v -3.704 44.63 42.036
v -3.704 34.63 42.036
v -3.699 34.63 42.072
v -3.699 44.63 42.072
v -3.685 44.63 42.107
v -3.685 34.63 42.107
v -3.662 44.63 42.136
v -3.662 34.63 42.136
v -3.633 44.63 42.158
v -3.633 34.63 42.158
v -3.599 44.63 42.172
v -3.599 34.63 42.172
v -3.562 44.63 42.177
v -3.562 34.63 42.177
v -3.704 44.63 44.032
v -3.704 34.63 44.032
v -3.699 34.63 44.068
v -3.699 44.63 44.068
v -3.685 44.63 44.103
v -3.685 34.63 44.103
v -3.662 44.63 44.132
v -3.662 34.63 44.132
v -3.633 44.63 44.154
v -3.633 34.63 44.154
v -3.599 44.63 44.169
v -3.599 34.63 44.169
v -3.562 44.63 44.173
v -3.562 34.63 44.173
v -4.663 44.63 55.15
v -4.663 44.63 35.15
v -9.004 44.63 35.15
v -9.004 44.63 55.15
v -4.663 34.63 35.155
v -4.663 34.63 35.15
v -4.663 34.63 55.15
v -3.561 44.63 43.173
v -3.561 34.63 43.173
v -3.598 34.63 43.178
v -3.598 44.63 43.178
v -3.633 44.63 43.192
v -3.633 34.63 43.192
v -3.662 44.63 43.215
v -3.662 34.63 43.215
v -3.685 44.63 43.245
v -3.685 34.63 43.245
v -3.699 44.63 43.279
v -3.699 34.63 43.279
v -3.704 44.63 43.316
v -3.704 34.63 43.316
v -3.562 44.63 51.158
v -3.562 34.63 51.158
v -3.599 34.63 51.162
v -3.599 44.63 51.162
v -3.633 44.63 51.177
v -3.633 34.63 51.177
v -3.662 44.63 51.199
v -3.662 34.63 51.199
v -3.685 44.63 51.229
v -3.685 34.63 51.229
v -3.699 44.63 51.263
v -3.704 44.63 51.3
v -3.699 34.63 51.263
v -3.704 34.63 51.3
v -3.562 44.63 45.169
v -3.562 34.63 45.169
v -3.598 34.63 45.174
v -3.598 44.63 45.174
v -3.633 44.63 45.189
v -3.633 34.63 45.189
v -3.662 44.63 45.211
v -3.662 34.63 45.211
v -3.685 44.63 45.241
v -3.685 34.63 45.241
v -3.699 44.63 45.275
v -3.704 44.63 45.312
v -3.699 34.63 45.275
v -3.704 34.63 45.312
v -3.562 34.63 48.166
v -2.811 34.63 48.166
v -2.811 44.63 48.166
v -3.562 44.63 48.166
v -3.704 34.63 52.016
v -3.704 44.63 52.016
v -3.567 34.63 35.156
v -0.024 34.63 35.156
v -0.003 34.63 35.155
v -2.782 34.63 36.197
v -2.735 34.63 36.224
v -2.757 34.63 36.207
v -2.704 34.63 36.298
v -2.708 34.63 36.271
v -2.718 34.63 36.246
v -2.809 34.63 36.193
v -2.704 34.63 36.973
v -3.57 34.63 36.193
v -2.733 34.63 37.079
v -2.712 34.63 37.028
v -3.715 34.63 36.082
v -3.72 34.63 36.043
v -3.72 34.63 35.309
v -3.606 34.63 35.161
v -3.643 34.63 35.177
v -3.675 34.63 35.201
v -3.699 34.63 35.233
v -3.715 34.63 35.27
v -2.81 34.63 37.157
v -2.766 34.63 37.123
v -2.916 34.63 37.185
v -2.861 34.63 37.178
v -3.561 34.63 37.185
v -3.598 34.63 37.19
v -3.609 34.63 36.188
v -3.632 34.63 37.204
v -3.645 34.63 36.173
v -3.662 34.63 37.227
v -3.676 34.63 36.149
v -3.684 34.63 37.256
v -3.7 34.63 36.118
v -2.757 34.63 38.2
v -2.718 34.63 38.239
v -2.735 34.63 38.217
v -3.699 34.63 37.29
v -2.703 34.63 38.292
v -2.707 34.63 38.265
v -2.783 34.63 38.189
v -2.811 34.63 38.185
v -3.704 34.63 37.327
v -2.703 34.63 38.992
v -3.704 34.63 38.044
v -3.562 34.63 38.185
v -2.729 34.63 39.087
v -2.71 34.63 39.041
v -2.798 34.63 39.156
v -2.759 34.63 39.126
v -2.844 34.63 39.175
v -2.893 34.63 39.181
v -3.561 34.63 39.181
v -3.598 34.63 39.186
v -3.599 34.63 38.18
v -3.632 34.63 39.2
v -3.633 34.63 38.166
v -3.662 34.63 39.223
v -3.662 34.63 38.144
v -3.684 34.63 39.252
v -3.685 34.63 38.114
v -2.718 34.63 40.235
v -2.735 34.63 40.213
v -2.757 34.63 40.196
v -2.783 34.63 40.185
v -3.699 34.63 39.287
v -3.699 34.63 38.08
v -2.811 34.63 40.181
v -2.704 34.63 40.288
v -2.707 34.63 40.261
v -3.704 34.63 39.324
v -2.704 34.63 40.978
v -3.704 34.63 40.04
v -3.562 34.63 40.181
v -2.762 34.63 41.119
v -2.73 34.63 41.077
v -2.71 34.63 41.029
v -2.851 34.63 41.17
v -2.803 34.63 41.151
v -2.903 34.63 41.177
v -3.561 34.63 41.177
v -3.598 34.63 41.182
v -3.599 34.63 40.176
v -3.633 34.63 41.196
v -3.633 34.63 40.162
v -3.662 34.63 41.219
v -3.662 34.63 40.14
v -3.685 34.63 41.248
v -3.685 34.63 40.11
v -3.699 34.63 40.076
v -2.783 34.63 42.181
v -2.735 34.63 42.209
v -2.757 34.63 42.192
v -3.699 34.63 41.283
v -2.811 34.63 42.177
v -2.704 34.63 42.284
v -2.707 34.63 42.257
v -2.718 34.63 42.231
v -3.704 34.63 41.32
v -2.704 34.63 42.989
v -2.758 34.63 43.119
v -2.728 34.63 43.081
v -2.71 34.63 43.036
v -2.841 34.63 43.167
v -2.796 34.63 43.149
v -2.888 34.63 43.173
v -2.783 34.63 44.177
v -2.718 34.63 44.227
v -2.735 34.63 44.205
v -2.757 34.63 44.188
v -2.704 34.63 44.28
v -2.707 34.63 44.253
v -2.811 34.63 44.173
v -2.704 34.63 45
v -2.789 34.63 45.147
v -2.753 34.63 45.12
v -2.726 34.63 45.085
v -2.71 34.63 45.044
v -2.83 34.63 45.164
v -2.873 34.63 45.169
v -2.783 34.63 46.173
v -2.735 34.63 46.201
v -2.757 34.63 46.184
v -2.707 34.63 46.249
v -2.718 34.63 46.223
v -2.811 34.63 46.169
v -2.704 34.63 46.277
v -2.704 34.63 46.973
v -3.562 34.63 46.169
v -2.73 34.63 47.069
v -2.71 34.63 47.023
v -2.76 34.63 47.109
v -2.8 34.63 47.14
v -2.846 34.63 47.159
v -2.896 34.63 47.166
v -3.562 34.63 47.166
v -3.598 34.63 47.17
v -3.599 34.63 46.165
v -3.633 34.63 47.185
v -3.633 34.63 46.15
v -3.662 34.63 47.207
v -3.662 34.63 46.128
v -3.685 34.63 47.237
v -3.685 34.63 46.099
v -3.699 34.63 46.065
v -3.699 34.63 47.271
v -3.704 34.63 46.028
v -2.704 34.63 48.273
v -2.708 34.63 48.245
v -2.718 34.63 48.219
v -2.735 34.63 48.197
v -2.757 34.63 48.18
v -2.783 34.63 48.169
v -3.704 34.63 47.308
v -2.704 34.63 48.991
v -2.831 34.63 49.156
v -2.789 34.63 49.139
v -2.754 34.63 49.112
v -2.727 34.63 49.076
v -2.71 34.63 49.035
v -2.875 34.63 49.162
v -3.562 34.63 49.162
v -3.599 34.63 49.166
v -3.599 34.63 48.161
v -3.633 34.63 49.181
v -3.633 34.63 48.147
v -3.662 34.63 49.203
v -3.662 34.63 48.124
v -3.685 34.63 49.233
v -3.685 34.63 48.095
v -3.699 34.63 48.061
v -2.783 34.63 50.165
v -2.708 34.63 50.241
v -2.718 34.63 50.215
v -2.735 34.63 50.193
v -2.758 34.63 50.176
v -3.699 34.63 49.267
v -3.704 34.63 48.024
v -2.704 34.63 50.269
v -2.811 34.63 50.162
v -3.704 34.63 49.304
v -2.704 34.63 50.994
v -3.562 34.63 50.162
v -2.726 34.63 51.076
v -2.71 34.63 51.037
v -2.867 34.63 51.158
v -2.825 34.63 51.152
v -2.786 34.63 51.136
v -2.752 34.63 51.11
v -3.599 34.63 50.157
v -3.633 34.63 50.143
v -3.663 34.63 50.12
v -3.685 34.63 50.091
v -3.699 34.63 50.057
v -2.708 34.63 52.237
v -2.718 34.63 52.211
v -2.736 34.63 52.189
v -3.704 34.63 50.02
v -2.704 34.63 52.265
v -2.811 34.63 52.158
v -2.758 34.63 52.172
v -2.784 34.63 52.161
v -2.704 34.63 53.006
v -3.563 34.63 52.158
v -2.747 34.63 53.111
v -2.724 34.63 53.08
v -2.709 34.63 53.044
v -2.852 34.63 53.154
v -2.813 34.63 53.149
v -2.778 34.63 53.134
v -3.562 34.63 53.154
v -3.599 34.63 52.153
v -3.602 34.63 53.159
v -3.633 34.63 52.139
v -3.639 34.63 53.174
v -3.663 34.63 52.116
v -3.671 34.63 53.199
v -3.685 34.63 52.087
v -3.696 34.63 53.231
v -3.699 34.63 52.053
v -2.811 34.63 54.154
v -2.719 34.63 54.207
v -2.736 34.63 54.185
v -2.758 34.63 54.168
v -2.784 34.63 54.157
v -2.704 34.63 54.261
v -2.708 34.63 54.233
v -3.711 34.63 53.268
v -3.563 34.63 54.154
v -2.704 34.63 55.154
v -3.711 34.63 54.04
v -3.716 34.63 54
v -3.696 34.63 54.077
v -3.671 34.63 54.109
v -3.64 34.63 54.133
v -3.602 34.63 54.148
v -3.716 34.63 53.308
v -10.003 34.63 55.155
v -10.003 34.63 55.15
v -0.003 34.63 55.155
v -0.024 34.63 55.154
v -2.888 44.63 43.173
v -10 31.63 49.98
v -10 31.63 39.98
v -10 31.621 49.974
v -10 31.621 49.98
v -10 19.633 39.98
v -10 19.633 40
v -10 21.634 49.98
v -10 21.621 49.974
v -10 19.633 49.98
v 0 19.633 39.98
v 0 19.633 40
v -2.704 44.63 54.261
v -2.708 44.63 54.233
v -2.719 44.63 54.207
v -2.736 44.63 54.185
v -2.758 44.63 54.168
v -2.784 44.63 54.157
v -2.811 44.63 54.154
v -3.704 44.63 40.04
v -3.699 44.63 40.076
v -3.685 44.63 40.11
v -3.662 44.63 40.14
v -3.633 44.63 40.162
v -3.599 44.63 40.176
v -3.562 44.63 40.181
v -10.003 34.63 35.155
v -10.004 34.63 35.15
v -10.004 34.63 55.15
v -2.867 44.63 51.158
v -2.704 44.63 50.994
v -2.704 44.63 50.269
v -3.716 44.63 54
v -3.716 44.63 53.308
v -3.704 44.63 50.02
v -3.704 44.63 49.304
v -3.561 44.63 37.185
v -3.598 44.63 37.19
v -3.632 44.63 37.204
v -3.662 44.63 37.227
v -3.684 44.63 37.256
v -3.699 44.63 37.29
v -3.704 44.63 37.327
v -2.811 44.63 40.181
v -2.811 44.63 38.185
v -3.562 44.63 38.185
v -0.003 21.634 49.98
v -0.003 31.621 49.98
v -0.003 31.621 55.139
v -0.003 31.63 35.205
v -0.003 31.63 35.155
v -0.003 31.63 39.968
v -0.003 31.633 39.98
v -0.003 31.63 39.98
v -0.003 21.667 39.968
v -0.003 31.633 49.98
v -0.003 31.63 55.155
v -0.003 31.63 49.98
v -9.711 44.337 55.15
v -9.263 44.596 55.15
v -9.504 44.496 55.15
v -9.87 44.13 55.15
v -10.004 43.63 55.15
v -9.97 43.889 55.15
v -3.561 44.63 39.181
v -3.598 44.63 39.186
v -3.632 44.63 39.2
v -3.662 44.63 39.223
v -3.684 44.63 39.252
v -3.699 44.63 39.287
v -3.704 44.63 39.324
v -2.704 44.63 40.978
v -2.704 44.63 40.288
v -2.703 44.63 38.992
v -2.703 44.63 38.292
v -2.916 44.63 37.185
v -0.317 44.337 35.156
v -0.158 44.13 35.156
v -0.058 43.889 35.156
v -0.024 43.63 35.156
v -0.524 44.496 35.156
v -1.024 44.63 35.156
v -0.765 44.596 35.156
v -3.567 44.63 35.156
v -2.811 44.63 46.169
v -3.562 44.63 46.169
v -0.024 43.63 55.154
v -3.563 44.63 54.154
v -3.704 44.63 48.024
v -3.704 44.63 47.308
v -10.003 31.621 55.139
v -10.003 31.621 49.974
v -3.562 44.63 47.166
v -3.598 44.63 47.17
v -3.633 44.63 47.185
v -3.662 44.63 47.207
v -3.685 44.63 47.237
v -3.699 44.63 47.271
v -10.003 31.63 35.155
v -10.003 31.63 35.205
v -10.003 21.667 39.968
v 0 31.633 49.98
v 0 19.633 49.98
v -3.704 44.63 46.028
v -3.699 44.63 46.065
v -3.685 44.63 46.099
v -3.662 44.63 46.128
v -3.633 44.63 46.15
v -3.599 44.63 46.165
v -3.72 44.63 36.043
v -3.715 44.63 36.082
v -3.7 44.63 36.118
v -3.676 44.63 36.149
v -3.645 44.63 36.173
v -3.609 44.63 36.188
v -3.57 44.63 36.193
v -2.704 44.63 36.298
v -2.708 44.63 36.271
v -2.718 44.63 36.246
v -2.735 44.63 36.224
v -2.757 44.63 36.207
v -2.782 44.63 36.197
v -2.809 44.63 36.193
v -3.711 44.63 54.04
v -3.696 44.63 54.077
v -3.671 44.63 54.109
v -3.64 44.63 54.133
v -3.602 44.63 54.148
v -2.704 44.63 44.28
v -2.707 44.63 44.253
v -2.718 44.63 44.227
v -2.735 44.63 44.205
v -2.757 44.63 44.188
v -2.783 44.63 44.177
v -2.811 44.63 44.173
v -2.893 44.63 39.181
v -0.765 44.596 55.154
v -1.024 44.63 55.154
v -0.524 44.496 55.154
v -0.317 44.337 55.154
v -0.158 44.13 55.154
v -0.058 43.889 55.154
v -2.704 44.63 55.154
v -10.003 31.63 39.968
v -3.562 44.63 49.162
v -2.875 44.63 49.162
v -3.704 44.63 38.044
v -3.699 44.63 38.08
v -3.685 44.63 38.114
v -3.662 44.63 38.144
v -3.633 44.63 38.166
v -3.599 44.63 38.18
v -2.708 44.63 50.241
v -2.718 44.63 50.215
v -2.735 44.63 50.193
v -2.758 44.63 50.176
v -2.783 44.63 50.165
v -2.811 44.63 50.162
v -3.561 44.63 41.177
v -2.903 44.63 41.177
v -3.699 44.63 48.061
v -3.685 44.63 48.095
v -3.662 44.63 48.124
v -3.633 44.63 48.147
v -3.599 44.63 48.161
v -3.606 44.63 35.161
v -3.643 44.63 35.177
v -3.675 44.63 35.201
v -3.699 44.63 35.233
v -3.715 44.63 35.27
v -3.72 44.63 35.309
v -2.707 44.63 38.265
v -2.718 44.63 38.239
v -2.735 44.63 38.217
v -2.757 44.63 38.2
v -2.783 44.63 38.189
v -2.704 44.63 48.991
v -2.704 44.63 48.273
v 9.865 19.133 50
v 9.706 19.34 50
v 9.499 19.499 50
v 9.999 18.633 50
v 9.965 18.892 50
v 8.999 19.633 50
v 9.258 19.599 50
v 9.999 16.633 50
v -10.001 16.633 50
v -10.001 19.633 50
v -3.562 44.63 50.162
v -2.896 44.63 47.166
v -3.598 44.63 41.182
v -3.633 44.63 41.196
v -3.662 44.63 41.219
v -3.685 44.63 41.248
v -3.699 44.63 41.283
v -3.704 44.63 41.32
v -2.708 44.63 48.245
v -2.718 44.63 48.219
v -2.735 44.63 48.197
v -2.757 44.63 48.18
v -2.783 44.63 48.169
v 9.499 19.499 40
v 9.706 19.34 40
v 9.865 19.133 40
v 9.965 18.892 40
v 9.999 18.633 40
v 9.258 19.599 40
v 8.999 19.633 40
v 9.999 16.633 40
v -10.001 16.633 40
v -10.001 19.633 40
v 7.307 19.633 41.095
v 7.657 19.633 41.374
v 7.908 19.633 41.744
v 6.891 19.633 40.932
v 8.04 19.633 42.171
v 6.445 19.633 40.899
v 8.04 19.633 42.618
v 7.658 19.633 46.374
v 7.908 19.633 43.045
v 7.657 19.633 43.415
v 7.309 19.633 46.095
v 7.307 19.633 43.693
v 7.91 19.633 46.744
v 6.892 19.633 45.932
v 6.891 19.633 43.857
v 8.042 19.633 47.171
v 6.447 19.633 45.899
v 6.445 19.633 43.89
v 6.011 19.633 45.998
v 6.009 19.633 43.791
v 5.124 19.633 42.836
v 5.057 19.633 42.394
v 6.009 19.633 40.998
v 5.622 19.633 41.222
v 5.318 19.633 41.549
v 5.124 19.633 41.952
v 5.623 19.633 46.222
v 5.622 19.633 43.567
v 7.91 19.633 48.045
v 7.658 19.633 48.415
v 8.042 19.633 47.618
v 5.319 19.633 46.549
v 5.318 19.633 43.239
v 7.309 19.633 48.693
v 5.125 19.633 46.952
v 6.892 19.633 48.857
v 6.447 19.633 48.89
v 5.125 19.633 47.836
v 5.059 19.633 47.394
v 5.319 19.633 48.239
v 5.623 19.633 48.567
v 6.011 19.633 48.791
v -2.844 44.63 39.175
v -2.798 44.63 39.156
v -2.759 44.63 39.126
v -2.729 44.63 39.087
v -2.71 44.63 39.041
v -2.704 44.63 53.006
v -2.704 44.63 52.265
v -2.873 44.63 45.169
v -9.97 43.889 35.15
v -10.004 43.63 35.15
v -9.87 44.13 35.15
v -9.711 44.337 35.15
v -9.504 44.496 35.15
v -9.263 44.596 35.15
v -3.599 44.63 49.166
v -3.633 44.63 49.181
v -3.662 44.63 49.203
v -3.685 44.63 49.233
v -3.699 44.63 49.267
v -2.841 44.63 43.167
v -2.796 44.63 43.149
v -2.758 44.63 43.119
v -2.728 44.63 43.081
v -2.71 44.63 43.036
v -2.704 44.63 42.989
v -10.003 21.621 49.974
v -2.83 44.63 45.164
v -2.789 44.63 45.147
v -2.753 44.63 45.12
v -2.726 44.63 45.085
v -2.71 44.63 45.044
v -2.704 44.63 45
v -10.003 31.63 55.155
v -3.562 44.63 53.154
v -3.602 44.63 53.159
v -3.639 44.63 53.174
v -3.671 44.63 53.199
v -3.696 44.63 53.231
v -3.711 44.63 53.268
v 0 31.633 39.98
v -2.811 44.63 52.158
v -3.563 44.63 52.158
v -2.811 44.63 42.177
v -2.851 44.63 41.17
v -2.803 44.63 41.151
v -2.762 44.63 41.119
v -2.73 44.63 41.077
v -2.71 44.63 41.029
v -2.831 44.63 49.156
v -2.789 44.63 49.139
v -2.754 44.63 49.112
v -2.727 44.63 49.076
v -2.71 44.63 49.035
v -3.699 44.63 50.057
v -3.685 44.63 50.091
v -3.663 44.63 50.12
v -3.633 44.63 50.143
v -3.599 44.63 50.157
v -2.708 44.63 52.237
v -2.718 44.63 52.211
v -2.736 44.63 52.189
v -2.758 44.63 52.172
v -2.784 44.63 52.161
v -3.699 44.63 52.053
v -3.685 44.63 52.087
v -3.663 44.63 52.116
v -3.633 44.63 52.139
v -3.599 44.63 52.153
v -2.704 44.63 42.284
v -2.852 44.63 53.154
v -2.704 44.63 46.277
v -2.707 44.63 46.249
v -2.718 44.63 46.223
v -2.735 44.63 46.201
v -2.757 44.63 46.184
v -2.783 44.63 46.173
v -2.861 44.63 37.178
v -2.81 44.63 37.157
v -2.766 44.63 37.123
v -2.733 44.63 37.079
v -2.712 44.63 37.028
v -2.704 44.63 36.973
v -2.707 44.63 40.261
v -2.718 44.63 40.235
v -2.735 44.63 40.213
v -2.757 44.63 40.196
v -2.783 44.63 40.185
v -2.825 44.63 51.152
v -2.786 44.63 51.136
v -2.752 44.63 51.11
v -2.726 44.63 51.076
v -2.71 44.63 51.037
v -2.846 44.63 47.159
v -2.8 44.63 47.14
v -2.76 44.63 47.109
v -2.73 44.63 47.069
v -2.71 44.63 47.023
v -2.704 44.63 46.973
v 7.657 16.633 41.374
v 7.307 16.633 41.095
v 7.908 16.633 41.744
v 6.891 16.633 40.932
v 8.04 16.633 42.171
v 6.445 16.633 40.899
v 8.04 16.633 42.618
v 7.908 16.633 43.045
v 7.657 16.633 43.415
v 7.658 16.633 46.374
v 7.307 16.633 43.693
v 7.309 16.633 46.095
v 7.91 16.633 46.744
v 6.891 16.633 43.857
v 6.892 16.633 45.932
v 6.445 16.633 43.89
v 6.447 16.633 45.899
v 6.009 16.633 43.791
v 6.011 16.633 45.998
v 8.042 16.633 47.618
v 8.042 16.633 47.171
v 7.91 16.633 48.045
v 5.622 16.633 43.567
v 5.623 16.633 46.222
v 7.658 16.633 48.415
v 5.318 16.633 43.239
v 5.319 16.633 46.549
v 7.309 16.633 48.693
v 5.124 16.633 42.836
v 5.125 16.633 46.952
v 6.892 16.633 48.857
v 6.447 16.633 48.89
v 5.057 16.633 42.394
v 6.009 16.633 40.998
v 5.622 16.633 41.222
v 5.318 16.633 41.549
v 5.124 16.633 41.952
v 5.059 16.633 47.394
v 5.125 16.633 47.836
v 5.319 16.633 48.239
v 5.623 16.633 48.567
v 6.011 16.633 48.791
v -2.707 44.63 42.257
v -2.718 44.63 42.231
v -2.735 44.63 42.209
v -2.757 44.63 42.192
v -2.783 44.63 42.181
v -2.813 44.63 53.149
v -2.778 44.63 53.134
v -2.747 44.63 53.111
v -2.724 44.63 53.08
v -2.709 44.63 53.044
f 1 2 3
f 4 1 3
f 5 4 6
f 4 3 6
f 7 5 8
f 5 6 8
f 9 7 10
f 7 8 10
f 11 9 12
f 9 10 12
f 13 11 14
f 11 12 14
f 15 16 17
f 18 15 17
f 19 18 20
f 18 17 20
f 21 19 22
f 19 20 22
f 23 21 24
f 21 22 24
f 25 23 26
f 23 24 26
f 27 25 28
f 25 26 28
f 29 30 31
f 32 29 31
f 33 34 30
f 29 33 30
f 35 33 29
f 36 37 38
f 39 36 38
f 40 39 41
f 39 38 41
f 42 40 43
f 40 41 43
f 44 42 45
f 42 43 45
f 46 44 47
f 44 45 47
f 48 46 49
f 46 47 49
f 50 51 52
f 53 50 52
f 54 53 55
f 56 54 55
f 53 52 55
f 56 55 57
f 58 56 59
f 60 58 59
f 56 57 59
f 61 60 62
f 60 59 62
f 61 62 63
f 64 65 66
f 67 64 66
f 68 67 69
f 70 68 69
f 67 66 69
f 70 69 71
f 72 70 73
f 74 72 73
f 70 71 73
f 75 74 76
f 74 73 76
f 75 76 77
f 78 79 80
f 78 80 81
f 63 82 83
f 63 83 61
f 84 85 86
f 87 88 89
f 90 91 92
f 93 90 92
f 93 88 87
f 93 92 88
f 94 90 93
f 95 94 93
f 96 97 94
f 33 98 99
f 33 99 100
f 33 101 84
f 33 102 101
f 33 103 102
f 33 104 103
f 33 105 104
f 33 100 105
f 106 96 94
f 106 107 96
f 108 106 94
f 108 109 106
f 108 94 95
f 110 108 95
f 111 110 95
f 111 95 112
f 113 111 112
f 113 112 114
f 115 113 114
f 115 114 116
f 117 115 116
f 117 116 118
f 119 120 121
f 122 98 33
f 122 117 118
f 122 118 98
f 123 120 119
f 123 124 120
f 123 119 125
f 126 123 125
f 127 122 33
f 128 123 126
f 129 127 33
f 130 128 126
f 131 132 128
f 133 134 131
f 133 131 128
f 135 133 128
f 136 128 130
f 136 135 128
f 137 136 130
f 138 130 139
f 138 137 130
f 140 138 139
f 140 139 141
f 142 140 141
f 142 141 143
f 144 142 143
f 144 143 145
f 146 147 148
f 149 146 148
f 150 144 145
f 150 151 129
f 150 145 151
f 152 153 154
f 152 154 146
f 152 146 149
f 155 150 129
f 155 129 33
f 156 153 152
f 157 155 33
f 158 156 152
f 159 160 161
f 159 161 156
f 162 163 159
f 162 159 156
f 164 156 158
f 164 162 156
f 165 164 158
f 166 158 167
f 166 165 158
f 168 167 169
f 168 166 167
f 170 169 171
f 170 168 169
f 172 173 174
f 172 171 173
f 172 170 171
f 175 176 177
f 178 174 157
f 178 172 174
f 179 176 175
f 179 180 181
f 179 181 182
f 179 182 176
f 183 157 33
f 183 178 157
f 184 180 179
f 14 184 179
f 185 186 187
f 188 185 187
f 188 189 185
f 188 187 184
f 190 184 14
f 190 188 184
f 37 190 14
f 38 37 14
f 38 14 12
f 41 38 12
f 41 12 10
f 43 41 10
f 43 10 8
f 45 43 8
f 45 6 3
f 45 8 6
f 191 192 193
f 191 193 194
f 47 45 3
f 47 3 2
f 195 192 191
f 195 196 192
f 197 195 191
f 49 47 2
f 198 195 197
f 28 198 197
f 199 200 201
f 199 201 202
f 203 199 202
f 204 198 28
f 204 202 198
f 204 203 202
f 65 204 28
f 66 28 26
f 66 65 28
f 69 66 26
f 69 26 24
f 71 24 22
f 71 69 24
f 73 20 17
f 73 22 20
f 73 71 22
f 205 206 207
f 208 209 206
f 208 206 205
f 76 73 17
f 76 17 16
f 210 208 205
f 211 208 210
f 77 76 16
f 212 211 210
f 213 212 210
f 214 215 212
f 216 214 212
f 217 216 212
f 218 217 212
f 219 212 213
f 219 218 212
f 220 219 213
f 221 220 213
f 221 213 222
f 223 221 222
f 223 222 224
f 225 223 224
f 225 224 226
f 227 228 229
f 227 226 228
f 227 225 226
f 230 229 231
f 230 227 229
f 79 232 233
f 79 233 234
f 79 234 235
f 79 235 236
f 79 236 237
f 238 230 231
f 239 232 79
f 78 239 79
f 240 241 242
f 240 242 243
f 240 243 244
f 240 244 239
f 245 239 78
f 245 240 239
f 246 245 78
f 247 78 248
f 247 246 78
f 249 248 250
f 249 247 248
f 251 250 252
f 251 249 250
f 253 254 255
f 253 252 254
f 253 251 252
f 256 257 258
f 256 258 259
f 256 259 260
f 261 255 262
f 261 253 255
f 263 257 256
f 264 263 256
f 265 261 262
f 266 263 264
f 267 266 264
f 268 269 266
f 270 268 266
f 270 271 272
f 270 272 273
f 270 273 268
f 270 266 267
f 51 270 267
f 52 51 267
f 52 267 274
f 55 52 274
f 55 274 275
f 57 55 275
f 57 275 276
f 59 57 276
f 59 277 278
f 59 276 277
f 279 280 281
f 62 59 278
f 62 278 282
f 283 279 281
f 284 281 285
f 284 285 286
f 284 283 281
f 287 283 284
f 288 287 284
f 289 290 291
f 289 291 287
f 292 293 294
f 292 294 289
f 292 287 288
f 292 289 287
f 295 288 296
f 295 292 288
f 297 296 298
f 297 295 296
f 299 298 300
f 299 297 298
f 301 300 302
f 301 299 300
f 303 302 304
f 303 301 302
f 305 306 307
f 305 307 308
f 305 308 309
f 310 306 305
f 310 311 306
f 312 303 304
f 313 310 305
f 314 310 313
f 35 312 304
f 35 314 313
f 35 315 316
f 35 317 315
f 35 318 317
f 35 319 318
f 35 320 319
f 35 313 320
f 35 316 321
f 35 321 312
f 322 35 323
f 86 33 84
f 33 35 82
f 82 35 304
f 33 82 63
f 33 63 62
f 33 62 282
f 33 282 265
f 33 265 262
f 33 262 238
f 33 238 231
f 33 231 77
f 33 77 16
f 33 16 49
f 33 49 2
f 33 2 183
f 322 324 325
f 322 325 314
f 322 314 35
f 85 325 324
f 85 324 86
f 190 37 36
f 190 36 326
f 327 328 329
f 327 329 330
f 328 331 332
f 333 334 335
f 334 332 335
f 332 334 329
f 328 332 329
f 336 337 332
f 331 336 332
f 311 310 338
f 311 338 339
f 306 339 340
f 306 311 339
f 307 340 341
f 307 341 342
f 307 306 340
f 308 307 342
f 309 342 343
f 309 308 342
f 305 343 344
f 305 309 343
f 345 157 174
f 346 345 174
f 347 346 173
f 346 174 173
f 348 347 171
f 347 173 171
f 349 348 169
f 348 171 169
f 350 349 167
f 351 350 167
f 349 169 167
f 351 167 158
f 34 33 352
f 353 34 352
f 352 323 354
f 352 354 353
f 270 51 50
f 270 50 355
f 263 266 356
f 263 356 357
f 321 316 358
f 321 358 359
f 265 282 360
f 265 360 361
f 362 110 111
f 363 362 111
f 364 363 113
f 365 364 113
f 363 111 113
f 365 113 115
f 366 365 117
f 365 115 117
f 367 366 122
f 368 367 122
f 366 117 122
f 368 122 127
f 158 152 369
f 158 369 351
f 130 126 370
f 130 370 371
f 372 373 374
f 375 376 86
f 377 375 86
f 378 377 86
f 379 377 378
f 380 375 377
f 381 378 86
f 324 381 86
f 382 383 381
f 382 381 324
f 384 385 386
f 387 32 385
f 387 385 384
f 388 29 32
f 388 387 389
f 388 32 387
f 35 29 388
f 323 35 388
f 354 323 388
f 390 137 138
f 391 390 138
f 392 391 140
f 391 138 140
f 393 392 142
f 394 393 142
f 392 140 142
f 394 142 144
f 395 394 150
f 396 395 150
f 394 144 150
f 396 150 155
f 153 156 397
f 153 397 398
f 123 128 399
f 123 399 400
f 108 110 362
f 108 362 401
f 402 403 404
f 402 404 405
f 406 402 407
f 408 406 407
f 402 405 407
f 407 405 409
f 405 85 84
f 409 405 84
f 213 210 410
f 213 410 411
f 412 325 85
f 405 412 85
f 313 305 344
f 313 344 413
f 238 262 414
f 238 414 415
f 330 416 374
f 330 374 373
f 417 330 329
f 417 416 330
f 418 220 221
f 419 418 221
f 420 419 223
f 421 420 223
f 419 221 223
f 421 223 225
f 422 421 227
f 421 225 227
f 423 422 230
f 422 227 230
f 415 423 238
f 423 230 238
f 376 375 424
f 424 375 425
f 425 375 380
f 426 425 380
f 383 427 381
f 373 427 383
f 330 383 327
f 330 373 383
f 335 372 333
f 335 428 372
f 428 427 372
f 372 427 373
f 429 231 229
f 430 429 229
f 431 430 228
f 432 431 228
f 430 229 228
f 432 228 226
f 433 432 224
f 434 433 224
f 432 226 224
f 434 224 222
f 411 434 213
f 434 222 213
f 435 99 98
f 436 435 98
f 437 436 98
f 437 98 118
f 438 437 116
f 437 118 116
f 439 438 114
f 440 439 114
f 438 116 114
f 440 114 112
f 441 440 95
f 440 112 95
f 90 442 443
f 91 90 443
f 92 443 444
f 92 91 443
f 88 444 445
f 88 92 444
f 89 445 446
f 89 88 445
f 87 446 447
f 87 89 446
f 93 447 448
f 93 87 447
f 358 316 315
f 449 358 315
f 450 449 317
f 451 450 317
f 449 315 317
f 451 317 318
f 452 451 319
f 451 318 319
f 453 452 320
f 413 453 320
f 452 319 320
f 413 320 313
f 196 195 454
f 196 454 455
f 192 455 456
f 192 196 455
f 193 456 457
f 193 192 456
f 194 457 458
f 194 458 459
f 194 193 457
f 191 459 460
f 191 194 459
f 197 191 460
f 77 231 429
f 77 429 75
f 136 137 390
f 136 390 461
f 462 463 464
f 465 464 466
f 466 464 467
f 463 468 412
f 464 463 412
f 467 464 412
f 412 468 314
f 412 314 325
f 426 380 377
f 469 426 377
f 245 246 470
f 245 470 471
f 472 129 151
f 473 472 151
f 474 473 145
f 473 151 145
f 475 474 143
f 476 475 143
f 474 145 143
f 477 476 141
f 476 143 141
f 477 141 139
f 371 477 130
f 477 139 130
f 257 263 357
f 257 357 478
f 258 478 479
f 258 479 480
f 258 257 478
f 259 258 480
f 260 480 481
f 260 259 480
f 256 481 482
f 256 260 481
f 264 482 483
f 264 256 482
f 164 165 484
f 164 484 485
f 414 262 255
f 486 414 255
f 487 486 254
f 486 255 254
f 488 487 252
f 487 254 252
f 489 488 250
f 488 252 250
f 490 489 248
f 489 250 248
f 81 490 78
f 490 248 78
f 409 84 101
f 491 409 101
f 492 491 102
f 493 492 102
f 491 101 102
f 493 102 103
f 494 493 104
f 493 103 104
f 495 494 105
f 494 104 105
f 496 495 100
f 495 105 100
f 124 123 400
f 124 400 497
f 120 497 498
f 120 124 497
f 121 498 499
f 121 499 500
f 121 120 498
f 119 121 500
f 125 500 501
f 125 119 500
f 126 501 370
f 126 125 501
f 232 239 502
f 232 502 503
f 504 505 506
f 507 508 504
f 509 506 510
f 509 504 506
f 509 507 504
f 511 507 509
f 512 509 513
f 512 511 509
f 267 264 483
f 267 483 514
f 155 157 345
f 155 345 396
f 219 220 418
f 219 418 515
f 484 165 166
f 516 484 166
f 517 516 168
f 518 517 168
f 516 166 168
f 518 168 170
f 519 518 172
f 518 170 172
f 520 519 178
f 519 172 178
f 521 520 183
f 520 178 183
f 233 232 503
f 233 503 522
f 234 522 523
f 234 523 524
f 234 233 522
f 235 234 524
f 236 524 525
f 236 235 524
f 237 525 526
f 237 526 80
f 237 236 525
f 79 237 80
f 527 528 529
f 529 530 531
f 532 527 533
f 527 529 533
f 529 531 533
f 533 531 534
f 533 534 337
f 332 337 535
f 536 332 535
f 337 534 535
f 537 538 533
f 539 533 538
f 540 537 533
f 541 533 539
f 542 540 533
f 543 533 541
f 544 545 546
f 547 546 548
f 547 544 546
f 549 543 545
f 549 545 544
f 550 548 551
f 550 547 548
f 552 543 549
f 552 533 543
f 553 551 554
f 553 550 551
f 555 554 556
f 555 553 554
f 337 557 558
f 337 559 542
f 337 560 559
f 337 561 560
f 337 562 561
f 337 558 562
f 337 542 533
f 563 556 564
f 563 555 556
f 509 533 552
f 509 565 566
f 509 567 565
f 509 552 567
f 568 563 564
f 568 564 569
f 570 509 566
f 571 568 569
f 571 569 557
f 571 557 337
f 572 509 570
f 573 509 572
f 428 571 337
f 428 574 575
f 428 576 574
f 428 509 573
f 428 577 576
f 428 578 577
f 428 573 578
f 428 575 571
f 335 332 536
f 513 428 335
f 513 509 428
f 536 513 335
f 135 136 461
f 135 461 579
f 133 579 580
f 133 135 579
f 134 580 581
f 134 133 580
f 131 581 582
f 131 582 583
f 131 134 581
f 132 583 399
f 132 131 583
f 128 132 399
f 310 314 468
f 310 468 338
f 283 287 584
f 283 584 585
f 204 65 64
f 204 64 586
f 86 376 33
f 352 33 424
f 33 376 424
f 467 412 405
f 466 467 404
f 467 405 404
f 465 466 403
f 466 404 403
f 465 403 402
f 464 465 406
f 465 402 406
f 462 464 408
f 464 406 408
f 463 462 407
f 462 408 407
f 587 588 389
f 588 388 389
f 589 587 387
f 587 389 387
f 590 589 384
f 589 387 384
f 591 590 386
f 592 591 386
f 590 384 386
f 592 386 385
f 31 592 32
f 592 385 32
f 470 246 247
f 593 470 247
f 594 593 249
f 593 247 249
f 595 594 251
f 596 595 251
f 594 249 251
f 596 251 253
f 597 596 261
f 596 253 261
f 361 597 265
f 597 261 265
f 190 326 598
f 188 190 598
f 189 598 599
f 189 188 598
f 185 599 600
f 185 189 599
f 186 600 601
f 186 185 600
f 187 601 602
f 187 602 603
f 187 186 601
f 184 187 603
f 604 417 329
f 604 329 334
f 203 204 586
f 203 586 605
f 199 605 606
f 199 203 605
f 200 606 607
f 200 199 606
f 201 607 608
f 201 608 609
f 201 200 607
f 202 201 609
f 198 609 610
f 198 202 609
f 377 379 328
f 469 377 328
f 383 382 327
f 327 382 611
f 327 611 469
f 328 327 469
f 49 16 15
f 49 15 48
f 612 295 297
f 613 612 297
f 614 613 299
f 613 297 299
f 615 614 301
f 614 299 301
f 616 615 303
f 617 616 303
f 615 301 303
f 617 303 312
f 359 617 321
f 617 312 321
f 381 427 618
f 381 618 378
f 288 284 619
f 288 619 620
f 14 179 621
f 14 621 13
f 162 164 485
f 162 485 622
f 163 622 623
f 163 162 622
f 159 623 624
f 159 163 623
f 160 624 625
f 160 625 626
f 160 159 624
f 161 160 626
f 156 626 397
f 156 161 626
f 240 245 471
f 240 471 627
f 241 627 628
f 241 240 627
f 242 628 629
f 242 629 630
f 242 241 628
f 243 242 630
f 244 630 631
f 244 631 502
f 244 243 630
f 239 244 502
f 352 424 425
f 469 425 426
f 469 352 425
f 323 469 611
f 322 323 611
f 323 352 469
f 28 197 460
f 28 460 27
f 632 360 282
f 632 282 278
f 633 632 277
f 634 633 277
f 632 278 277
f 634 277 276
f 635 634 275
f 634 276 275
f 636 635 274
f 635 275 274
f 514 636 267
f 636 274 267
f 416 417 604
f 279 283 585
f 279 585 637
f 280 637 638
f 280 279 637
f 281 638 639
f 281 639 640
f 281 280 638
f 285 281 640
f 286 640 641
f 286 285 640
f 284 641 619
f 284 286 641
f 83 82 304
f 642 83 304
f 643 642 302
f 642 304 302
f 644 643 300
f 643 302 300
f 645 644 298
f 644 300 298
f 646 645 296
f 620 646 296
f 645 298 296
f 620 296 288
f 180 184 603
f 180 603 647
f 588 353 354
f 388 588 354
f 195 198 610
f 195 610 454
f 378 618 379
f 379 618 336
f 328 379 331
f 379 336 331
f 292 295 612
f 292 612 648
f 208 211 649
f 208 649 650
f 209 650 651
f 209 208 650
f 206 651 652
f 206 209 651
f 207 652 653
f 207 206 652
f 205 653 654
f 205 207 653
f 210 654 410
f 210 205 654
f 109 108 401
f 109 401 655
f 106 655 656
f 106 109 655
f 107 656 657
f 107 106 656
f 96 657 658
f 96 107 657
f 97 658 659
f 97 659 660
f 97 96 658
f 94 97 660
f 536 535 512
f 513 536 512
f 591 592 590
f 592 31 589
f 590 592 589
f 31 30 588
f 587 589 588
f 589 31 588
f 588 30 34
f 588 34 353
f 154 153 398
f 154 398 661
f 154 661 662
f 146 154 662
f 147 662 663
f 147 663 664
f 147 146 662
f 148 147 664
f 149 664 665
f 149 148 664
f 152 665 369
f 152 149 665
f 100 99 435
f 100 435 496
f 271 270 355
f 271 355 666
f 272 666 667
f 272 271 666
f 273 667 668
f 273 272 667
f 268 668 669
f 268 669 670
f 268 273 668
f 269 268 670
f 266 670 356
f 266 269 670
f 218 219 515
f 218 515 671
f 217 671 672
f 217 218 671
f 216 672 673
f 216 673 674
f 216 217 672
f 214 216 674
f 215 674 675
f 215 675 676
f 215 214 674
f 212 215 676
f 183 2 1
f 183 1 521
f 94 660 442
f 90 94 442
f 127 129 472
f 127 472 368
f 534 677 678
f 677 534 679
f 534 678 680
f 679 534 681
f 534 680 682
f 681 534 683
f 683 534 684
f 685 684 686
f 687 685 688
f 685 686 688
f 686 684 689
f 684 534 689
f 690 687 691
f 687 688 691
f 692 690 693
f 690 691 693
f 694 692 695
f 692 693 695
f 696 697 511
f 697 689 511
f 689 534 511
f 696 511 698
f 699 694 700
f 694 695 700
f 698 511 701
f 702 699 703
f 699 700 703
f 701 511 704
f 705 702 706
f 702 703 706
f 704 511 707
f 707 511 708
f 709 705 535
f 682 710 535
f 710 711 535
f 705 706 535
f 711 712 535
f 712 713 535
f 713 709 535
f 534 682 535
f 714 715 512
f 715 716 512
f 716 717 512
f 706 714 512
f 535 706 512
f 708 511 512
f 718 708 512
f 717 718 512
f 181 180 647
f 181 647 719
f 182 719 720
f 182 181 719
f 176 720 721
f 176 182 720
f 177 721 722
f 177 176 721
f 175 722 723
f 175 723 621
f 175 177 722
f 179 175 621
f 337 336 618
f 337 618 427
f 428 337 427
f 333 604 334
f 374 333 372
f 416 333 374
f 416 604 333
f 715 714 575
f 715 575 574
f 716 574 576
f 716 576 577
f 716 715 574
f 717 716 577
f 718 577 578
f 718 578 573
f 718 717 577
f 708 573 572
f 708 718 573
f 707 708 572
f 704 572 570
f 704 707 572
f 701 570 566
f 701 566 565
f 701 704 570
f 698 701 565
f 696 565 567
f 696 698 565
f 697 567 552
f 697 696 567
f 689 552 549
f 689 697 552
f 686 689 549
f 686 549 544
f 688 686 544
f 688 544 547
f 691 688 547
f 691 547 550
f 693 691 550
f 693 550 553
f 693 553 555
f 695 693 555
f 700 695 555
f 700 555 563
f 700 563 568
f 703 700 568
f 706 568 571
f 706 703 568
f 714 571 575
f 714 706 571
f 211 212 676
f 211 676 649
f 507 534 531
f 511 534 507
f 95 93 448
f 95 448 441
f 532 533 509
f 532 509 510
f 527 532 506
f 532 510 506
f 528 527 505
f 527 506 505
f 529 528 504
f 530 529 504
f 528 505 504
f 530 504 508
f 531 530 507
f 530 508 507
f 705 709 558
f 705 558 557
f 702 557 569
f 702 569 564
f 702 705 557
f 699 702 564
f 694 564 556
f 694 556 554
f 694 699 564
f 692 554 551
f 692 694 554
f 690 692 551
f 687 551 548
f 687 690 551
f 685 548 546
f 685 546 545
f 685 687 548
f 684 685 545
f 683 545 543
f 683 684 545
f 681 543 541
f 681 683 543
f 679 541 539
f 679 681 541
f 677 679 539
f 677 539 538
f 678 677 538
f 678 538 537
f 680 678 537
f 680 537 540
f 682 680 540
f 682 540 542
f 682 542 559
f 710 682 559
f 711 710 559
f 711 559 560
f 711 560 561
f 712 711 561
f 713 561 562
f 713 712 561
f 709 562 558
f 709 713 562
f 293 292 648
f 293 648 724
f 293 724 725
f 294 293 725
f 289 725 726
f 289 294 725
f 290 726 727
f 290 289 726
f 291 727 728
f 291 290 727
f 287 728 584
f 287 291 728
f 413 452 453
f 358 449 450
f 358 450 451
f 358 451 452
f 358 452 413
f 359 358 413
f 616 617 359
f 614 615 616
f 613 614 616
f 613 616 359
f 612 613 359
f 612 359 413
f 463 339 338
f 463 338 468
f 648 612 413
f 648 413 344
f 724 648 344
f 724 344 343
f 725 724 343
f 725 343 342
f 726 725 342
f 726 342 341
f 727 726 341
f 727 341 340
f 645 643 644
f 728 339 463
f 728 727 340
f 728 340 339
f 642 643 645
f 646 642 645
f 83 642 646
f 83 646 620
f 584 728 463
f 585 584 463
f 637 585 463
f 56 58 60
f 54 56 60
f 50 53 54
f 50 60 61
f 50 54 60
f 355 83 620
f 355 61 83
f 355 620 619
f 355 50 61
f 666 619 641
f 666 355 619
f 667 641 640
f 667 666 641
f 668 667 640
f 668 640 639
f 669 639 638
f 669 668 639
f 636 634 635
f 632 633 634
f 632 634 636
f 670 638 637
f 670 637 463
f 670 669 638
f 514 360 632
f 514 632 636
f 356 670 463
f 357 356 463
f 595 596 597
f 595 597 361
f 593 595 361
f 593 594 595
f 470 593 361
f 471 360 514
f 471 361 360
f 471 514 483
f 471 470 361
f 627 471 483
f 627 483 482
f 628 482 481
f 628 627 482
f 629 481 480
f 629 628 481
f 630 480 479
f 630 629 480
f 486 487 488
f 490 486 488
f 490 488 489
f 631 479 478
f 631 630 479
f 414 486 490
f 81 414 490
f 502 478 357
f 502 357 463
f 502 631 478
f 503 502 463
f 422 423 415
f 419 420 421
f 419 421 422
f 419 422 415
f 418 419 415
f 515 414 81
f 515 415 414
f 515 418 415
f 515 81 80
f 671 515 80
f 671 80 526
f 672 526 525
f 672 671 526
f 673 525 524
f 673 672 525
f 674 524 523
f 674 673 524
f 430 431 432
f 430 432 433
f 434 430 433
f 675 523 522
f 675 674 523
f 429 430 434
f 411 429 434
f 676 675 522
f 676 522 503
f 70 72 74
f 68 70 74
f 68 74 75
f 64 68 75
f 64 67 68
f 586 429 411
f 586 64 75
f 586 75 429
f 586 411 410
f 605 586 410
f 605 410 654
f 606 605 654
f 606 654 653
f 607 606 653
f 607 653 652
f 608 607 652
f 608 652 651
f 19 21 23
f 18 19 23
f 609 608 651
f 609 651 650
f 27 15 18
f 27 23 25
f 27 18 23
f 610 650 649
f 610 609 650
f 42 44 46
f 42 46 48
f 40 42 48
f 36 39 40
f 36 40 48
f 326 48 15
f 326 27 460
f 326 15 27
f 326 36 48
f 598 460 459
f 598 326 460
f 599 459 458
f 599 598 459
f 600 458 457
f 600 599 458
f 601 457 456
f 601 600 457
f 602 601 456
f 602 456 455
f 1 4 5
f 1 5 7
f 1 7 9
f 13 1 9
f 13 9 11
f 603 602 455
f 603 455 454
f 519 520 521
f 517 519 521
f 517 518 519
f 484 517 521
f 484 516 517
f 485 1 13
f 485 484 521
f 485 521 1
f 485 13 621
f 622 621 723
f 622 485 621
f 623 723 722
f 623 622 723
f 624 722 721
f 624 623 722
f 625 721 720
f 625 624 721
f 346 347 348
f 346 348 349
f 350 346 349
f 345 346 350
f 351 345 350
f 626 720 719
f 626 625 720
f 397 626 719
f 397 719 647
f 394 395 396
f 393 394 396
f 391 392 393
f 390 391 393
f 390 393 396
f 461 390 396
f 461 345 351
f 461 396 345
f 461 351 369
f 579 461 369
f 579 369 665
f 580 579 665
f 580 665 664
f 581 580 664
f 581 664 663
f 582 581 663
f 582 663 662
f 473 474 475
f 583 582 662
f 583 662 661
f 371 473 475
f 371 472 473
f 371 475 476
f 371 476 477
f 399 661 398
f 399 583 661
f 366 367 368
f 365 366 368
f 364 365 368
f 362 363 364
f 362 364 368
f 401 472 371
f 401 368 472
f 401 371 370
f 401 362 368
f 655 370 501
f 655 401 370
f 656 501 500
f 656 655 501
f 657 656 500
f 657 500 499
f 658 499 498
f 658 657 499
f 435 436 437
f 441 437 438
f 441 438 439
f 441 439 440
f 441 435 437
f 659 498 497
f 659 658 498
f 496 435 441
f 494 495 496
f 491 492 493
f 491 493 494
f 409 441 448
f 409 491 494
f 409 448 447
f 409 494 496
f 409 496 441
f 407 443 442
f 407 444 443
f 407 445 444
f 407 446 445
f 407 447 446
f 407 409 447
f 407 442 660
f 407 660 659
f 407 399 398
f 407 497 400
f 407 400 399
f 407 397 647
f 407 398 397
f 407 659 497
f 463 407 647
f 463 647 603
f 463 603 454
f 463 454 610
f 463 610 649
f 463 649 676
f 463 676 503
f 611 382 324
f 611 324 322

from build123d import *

# Parameters (mm, degrees)
SKETCH014_W  = 20
SKETCH014_H  = 10
SKETCH014_R  = 1.5
PAD006_DEPTH = 3
SKETCH015_W  = 10
SKETCH015_H  = 10
PAD007_DEPTH = 12
SKETCH028_W  = 10
SKETCH028_H  = 20
PAD014_DEPTH = 3
PAD015_DEPTH = 10
SKETCH029_W  = 5.341147
SKETCH029_H  = 20
PAD016_DEPTH = 10
PAD017_DEPTH = 10
FILLET001_R  = 1
FILLET002_R  = 1
FILLET003_R  = 1


with BuildPart() as part:
    # Sketch014 → Pad006 (new body)
    with BuildSketch(Plane(origin=(0, 16.63325, 0), x_dir=(-1, 0, 0), z_dir=(0, 1, 0))):
        with Locations((0.000853, 44.999577)):
            Rectangle(SKETCH014_W, SKETCH014_H)
        with Locations((-6.55861, 47.39436)):
            Circle(SKETCH014_R, mode=Mode.SUBTRACT)
        with Locations((-6.556974, 42.39436)):
            Circle(SKETCH014_R, mode=Mode.SUBTRACT)
    extrude(amount=PAD006_DEPTH)

    # Sketch015 (on Face8 of Pad006) → Pad007 (join)
    with BuildSketch(Plane(origin=(-10, 19.63325, 0), x_dir=(-1, 0, 0), z_dir=(0, 1, 0))):
        with Locations((-5, 44.980343)):
            Rectangle(SKETCH015_W, SKETCH015_H)
    extrude(amount=PAD007_DEPTH)

    # Sketch028 → Pad014 (join)
    with BuildSketch(Plane(origin=(0, 31.63, 0), x_dir=(-1, 0, 0), z_dir=(0, 1, 0))):
        with Locations((5.002885, 45.155186)):
            Rectangle(SKETCH028_W, SKETCH028_H)
    extrude(amount=PAD014_DEPTH)

    # Sketch027 → Pad015 (join)
    with BuildSketch(Plane(origin=(-2, 34.63, 45), x_dir=(1, 0, 0), z_dir=(0, 1, 0))):
        with BuildLine():
            Line((1.975717, 9.843815), (-0.708844, 9.843815))
            Line((-1.566561, 9.843815), (-0.708844, 9.843815))
            ThreePointArc((-1.566561, 9.843815), (-1.674924, 9.798929), (-1.71981, 9.690566))
            Line((-1.71981, 8.956594), (-1.71981, 9.690566))
            ThreePointArc((-1.71981, 8.956594), (-1.675937, 8.850677), (-1.57002, 8.806804))
            Line((-0.809443, 8.806804), (-1.57002, 8.806804))
            ThreePointArc((-0.704389, 8.701751), (-0.735158, 8.776035), (-0.809443, 8.806804))
            Line((-0.704389, 8.026948), (-0.704389, 8.701751))
            ThreePointArc((-0.916234, 7.815103), (-0.766437, 7.877151), (-0.704389, 8.026948))
            Line((-1.56111, 7.815103), (-0.916234, 7.815103))
            ThreePointArc((-1.56111, 7.815103), (-1.661811, 7.773391), (-1.703522, 7.672691))
            Line((-1.703522, 6.956427), (-1.703522, 7.672691))
            ThreePointArc((-1.703522, 6.956427), (-1.662049, 6.856302), (-1.561925, 6.81483))
            Line((-0.810564, 6.81483), (-1.561925, 6.81483))
            ThreePointArc((-0.703462, 6.707728), (-0.734831, 6.78346), (-0.810564, 6.81483))
            Line((-0.703462, 6.007832), (-0.703462, 6.707728))
            ThreePointArc((-0.892518, 5.818776), (-0.758835, 5.874149), (-0.703462, 6.007832))
            Line((-1.561271, 5.818776), (-0.892518, 5.818776))
            ThreePointArc((-1.561271, 5.818776), (-1.661881, 5.777102), (-1.703555, 5.676492))
            Line((-1.703555, 4.96034), (-1.703555, 5.676492))
            ThreePointArc((-1.703555, 4.96034), (-1.662091, 4.860238), (-1.56199, 4.818775))
            Line((-0.810665, 4.818775), (-1.56199, 4.818775))
            ThreePointArc((-0.703555, 4.711665), (-0.734926, 4.787403), (-0.810665, 4.818775))
            Line((-0.703555, 4.022301), (-0.703555, 4.711665))
            ThreePointArc((-0.903152, 3.822704), (-0.762015, 3.881164), (-0.703555, 4.022301))
            Line((-1.561369, 3.822704), (-0.903152, 3.822704))
            ThreePointArc((-1.561369, 3.822704), (-1.661978, 3.78103), (-1.703652, 3.680421))
            Line((-1.703652, 2.964269), (-1.703652, 3.680421))
            ThreePointArc((-1.703652, 2.964269), (-1.662188, 2.864167), (-1.562087, 2.822704))
            Line((-0.810762, 2.822704), (-1.562087, 2.822704))
            ThreePointArc((-0.703652, 2.715594), (-0.735023, 2.791332), (-0.810762, 2.822704))
            Line((-0.703652, 2.011374), (-0.703652, 2.715594))
            ThreePointArc((-0.888393, 1.826633), (-0.757761, 1.880742), (-0.703652, 2.011374))
            Line((-1.561466, 1.826633), (-0.888393, 1.826633))
            ThreePointArc((-1.561466, 1.826633), (-1.662075, 1.784959), (-1.703749, 1.68435))
            Line((-1.703749, 0.968198), (-1.703749, 1.68435))
            ThreePointArc((-1.703749, 0.968198), (-1.662285, 0.868096), (-1.562184, 0.826633))
            Line((-0.810859, 0.826633), (-1.562184, 0.826633))
            ThreePointArc((-0.703749, 0.719523), (-0.73512, 0.795261), (-0.810859, 0.826633))
            Line((-0.703749, 0.000302), (-0.703749, 0.719523))
            ThreePointArc((-0.873489, -0.169438), (-0.753464, -0.119723), (-0.703749, 0.000302))
            Line((-1.561563, -0.169438), (-0.873489, -0.169438))
            ThreePointArc((-1.561563, -0.169438), (-1.662172, -0.211112), (-1.703846, -0.311721))
            Line((-1.703846, -1.027873), (-1.703846, -0.311721))
            ThreePointArc((-1.703846, -1.027873), (-1.662382, -1.127975), (-1.562281, -1.169438))
            Line((-0.810956, -1.169438), (-1.562281, -1.169438))
            ThreePointArc((-0.703846, -1.276548), (-0.735217, -1.20081), (-0.810956, -1.169438))
            Line((-0.703846, -1.973203), (-0.703846, -1.276548))
            ThreePointArc((-0.896152, -2.165509), (-0.760171, -2.109184), (-0.703846, -1.973203))
            Line((-1.56166, -2.165509), (-0.896152, -2.165509))
            ThreePointArc((-1.56166, -2.165509), (-1.662269, -2.207183), (-1.703943, -2.307792))
            Line((-1.703943, -3.023944), (-1.703943, -2.307792))
            ThreePointArc((-1.703943, -3.023944), (-1.662479, -3.124046), (-1.562378, -3.165509))
            Line((-0.811053, -3.165509), (-1.562378, -3.165509))
            ThreePointArc((-0.703943, -3.272619), (-0.735314, -3.196881), (-0.811053, -3.165509))
            Line((-0.703943, -3.990733), (-0.703943, -3.272619))
            ThreePointArc((-0.87479, -4.16158), (-0.753983, -4.11154), (-0.703943, -3.990733))
            Line((-1.561757, -4.16158), (-0.87479, -4.16158))
            ThreePointArc((-1.561757, -4.16158), (-1.662366, -4.203254), (-1.70404, -4.303863))
            Line((-1.70404, -5.020015), (-1.70404, -4.303863))
            ThreePointArc((-1.70404, -5.020015), (-1.662576, -5.120117), (-1.562475, -5.16158))
            Line((-0.81115, -5.16158), (-1.562475, -5.16158))
            ThreePointArc((-0.70404, -5.26869), (-0.735411, -5.192952), (-0.81115, -5.16158))
            Line((-0.70404, -5.994353), (-0.70404, -5.26869))
            ThreePointArc((-0.867338, -6.157651), (-0.751869, -6.109822), (-0.70404, -5.994353))
            Line((-1.561854, -6.157651), (-0.867338, -6.157651))
            ThreePointArc((-1.561854, -6.157651), (-1.662463, -6.199325), (-1.704137, -6.299934))
            Line((-1.704137, -7.016086), (-1.704137, -6.299934))
            ThreePointArc((-1.704137, -7.016086), (-1.662673, -7.116188), (-1.562572, -7.157651))
            Line((-0.811247, -7.157651), (-1.562572, -7.157651))
            ThreePointArc((-0.704137, -7.264761), (-0.735508, -7.189023), (-0.811247, -7.157651))
            Line((-0.704137, -8.006283), (-0.704137, -7.264761))
            ThreePointArc((-0.851576, -8.153722), (-0.747321, -8.110538), (-0.704137, -8.006283))
            Line((-1.561951, -8.153722), (-0.851576, -8.153722))
            ThreePointArc((-1.561951, -8.153722), (-1.671215, -8.198981), (-1.716474, -8.308246))
            Line((-1.716474, -8.999917), (-1.716474, -8.308246))
            ThreePointArc((-1.716474, -8.999917), (-1.671425, -9.108674), (-1.562669, -9.153722))
            Line((-0.811344, -9.153722), (-1.562669, -9.153722))
            ThreePointArc((-0.704234, -9.260832), (-0.735605, -9.185094), (-0.811344, -9.153722))
            Line((-0.704234, -10.153722), (-0.704234, -9.260832))
            Line((-0.704234, -10.153722), (1.975717, -10.153722))
            Line((1.975717, -10.153722), (1.975717, 9.843815))
        make_face()
    extrude(amount=PAD015_DEPTH)

    # Sketch029 → Pad016 (join)
    with BuildSketch(Plane(origin=(0, 34.63, 0), x_dir=(-1, 0, 0), z_dir=(0, 1, 0))):
        with Locations((7.333255, 45.149561)):
            Rectangle(SKETCH029_W, SKETCH029_H)
    extrude(amount=PAD016_DEPTH)

    # Sketch035 (on Face15 of Pad016) → AdditiveLoft002 section 0
    with BuildSketch(Plane(origin=(-0.002885, 16.63325, 0), x_dir=(0, 0, -1), z_dir=(1, 0, 0))):
        Polygon((-55.139091, 14.987795), (-49.973751, 14.987795), (-49.973751, 4.987795), align=None)
    # Sketch036 (on Face15 of Pad016) → AdditiveLoft002 section 1
    with BuildSketch(Plane(origin=(-10.002885, 16.63325, 0), x_dir=(0, 0, -1), z_dir=(1, 0, 0))):
        Polygon((-55.139091, 14.987795), (-49.973751, 14.987795), (-49.973751, 4.987795), align=None)
    loft()

    # Sketch037 (on Face19 of AdditiveLoft002) → Pad017 (join)
    with BuildSketch(Plane(origin=(-0.002885, 16.63325, 0), x_dir=(0, 0, -1), z_dir=(1, 0, 0))):
        Polygon((-39.968193, 15.033547), (-35.187713, 15.033547), (-39.968193, 5.033547), align=None)
    extrude(amount=-PAD017_DEPTH)

    # Fillet001
    fillet001_edges = [part.edges().sort_by_distance(p)[0] for p in [
        (9.999147, 19.63325, 44.999577),
    ]]
    fillet(fillet001_edges, radius=FILLET001_R)

    # Fillet002
    fillet002_edges = [part.edges().sort_by_distance(p)[0] for p in [
        (-0.024283, 44.63, 45.154954),
    ]]
    fillet(fillet002_edges, radius=FILLET002_R)

    # Fillet003
    fillet003_edges = [part.edges().sort_by_distance(p)[0] for p in [
        (-10.003829, 44.63, 45.149561),
    ]]
    fillet(fillet003_edges, radius=FILLET003_R)


solid = part.part
